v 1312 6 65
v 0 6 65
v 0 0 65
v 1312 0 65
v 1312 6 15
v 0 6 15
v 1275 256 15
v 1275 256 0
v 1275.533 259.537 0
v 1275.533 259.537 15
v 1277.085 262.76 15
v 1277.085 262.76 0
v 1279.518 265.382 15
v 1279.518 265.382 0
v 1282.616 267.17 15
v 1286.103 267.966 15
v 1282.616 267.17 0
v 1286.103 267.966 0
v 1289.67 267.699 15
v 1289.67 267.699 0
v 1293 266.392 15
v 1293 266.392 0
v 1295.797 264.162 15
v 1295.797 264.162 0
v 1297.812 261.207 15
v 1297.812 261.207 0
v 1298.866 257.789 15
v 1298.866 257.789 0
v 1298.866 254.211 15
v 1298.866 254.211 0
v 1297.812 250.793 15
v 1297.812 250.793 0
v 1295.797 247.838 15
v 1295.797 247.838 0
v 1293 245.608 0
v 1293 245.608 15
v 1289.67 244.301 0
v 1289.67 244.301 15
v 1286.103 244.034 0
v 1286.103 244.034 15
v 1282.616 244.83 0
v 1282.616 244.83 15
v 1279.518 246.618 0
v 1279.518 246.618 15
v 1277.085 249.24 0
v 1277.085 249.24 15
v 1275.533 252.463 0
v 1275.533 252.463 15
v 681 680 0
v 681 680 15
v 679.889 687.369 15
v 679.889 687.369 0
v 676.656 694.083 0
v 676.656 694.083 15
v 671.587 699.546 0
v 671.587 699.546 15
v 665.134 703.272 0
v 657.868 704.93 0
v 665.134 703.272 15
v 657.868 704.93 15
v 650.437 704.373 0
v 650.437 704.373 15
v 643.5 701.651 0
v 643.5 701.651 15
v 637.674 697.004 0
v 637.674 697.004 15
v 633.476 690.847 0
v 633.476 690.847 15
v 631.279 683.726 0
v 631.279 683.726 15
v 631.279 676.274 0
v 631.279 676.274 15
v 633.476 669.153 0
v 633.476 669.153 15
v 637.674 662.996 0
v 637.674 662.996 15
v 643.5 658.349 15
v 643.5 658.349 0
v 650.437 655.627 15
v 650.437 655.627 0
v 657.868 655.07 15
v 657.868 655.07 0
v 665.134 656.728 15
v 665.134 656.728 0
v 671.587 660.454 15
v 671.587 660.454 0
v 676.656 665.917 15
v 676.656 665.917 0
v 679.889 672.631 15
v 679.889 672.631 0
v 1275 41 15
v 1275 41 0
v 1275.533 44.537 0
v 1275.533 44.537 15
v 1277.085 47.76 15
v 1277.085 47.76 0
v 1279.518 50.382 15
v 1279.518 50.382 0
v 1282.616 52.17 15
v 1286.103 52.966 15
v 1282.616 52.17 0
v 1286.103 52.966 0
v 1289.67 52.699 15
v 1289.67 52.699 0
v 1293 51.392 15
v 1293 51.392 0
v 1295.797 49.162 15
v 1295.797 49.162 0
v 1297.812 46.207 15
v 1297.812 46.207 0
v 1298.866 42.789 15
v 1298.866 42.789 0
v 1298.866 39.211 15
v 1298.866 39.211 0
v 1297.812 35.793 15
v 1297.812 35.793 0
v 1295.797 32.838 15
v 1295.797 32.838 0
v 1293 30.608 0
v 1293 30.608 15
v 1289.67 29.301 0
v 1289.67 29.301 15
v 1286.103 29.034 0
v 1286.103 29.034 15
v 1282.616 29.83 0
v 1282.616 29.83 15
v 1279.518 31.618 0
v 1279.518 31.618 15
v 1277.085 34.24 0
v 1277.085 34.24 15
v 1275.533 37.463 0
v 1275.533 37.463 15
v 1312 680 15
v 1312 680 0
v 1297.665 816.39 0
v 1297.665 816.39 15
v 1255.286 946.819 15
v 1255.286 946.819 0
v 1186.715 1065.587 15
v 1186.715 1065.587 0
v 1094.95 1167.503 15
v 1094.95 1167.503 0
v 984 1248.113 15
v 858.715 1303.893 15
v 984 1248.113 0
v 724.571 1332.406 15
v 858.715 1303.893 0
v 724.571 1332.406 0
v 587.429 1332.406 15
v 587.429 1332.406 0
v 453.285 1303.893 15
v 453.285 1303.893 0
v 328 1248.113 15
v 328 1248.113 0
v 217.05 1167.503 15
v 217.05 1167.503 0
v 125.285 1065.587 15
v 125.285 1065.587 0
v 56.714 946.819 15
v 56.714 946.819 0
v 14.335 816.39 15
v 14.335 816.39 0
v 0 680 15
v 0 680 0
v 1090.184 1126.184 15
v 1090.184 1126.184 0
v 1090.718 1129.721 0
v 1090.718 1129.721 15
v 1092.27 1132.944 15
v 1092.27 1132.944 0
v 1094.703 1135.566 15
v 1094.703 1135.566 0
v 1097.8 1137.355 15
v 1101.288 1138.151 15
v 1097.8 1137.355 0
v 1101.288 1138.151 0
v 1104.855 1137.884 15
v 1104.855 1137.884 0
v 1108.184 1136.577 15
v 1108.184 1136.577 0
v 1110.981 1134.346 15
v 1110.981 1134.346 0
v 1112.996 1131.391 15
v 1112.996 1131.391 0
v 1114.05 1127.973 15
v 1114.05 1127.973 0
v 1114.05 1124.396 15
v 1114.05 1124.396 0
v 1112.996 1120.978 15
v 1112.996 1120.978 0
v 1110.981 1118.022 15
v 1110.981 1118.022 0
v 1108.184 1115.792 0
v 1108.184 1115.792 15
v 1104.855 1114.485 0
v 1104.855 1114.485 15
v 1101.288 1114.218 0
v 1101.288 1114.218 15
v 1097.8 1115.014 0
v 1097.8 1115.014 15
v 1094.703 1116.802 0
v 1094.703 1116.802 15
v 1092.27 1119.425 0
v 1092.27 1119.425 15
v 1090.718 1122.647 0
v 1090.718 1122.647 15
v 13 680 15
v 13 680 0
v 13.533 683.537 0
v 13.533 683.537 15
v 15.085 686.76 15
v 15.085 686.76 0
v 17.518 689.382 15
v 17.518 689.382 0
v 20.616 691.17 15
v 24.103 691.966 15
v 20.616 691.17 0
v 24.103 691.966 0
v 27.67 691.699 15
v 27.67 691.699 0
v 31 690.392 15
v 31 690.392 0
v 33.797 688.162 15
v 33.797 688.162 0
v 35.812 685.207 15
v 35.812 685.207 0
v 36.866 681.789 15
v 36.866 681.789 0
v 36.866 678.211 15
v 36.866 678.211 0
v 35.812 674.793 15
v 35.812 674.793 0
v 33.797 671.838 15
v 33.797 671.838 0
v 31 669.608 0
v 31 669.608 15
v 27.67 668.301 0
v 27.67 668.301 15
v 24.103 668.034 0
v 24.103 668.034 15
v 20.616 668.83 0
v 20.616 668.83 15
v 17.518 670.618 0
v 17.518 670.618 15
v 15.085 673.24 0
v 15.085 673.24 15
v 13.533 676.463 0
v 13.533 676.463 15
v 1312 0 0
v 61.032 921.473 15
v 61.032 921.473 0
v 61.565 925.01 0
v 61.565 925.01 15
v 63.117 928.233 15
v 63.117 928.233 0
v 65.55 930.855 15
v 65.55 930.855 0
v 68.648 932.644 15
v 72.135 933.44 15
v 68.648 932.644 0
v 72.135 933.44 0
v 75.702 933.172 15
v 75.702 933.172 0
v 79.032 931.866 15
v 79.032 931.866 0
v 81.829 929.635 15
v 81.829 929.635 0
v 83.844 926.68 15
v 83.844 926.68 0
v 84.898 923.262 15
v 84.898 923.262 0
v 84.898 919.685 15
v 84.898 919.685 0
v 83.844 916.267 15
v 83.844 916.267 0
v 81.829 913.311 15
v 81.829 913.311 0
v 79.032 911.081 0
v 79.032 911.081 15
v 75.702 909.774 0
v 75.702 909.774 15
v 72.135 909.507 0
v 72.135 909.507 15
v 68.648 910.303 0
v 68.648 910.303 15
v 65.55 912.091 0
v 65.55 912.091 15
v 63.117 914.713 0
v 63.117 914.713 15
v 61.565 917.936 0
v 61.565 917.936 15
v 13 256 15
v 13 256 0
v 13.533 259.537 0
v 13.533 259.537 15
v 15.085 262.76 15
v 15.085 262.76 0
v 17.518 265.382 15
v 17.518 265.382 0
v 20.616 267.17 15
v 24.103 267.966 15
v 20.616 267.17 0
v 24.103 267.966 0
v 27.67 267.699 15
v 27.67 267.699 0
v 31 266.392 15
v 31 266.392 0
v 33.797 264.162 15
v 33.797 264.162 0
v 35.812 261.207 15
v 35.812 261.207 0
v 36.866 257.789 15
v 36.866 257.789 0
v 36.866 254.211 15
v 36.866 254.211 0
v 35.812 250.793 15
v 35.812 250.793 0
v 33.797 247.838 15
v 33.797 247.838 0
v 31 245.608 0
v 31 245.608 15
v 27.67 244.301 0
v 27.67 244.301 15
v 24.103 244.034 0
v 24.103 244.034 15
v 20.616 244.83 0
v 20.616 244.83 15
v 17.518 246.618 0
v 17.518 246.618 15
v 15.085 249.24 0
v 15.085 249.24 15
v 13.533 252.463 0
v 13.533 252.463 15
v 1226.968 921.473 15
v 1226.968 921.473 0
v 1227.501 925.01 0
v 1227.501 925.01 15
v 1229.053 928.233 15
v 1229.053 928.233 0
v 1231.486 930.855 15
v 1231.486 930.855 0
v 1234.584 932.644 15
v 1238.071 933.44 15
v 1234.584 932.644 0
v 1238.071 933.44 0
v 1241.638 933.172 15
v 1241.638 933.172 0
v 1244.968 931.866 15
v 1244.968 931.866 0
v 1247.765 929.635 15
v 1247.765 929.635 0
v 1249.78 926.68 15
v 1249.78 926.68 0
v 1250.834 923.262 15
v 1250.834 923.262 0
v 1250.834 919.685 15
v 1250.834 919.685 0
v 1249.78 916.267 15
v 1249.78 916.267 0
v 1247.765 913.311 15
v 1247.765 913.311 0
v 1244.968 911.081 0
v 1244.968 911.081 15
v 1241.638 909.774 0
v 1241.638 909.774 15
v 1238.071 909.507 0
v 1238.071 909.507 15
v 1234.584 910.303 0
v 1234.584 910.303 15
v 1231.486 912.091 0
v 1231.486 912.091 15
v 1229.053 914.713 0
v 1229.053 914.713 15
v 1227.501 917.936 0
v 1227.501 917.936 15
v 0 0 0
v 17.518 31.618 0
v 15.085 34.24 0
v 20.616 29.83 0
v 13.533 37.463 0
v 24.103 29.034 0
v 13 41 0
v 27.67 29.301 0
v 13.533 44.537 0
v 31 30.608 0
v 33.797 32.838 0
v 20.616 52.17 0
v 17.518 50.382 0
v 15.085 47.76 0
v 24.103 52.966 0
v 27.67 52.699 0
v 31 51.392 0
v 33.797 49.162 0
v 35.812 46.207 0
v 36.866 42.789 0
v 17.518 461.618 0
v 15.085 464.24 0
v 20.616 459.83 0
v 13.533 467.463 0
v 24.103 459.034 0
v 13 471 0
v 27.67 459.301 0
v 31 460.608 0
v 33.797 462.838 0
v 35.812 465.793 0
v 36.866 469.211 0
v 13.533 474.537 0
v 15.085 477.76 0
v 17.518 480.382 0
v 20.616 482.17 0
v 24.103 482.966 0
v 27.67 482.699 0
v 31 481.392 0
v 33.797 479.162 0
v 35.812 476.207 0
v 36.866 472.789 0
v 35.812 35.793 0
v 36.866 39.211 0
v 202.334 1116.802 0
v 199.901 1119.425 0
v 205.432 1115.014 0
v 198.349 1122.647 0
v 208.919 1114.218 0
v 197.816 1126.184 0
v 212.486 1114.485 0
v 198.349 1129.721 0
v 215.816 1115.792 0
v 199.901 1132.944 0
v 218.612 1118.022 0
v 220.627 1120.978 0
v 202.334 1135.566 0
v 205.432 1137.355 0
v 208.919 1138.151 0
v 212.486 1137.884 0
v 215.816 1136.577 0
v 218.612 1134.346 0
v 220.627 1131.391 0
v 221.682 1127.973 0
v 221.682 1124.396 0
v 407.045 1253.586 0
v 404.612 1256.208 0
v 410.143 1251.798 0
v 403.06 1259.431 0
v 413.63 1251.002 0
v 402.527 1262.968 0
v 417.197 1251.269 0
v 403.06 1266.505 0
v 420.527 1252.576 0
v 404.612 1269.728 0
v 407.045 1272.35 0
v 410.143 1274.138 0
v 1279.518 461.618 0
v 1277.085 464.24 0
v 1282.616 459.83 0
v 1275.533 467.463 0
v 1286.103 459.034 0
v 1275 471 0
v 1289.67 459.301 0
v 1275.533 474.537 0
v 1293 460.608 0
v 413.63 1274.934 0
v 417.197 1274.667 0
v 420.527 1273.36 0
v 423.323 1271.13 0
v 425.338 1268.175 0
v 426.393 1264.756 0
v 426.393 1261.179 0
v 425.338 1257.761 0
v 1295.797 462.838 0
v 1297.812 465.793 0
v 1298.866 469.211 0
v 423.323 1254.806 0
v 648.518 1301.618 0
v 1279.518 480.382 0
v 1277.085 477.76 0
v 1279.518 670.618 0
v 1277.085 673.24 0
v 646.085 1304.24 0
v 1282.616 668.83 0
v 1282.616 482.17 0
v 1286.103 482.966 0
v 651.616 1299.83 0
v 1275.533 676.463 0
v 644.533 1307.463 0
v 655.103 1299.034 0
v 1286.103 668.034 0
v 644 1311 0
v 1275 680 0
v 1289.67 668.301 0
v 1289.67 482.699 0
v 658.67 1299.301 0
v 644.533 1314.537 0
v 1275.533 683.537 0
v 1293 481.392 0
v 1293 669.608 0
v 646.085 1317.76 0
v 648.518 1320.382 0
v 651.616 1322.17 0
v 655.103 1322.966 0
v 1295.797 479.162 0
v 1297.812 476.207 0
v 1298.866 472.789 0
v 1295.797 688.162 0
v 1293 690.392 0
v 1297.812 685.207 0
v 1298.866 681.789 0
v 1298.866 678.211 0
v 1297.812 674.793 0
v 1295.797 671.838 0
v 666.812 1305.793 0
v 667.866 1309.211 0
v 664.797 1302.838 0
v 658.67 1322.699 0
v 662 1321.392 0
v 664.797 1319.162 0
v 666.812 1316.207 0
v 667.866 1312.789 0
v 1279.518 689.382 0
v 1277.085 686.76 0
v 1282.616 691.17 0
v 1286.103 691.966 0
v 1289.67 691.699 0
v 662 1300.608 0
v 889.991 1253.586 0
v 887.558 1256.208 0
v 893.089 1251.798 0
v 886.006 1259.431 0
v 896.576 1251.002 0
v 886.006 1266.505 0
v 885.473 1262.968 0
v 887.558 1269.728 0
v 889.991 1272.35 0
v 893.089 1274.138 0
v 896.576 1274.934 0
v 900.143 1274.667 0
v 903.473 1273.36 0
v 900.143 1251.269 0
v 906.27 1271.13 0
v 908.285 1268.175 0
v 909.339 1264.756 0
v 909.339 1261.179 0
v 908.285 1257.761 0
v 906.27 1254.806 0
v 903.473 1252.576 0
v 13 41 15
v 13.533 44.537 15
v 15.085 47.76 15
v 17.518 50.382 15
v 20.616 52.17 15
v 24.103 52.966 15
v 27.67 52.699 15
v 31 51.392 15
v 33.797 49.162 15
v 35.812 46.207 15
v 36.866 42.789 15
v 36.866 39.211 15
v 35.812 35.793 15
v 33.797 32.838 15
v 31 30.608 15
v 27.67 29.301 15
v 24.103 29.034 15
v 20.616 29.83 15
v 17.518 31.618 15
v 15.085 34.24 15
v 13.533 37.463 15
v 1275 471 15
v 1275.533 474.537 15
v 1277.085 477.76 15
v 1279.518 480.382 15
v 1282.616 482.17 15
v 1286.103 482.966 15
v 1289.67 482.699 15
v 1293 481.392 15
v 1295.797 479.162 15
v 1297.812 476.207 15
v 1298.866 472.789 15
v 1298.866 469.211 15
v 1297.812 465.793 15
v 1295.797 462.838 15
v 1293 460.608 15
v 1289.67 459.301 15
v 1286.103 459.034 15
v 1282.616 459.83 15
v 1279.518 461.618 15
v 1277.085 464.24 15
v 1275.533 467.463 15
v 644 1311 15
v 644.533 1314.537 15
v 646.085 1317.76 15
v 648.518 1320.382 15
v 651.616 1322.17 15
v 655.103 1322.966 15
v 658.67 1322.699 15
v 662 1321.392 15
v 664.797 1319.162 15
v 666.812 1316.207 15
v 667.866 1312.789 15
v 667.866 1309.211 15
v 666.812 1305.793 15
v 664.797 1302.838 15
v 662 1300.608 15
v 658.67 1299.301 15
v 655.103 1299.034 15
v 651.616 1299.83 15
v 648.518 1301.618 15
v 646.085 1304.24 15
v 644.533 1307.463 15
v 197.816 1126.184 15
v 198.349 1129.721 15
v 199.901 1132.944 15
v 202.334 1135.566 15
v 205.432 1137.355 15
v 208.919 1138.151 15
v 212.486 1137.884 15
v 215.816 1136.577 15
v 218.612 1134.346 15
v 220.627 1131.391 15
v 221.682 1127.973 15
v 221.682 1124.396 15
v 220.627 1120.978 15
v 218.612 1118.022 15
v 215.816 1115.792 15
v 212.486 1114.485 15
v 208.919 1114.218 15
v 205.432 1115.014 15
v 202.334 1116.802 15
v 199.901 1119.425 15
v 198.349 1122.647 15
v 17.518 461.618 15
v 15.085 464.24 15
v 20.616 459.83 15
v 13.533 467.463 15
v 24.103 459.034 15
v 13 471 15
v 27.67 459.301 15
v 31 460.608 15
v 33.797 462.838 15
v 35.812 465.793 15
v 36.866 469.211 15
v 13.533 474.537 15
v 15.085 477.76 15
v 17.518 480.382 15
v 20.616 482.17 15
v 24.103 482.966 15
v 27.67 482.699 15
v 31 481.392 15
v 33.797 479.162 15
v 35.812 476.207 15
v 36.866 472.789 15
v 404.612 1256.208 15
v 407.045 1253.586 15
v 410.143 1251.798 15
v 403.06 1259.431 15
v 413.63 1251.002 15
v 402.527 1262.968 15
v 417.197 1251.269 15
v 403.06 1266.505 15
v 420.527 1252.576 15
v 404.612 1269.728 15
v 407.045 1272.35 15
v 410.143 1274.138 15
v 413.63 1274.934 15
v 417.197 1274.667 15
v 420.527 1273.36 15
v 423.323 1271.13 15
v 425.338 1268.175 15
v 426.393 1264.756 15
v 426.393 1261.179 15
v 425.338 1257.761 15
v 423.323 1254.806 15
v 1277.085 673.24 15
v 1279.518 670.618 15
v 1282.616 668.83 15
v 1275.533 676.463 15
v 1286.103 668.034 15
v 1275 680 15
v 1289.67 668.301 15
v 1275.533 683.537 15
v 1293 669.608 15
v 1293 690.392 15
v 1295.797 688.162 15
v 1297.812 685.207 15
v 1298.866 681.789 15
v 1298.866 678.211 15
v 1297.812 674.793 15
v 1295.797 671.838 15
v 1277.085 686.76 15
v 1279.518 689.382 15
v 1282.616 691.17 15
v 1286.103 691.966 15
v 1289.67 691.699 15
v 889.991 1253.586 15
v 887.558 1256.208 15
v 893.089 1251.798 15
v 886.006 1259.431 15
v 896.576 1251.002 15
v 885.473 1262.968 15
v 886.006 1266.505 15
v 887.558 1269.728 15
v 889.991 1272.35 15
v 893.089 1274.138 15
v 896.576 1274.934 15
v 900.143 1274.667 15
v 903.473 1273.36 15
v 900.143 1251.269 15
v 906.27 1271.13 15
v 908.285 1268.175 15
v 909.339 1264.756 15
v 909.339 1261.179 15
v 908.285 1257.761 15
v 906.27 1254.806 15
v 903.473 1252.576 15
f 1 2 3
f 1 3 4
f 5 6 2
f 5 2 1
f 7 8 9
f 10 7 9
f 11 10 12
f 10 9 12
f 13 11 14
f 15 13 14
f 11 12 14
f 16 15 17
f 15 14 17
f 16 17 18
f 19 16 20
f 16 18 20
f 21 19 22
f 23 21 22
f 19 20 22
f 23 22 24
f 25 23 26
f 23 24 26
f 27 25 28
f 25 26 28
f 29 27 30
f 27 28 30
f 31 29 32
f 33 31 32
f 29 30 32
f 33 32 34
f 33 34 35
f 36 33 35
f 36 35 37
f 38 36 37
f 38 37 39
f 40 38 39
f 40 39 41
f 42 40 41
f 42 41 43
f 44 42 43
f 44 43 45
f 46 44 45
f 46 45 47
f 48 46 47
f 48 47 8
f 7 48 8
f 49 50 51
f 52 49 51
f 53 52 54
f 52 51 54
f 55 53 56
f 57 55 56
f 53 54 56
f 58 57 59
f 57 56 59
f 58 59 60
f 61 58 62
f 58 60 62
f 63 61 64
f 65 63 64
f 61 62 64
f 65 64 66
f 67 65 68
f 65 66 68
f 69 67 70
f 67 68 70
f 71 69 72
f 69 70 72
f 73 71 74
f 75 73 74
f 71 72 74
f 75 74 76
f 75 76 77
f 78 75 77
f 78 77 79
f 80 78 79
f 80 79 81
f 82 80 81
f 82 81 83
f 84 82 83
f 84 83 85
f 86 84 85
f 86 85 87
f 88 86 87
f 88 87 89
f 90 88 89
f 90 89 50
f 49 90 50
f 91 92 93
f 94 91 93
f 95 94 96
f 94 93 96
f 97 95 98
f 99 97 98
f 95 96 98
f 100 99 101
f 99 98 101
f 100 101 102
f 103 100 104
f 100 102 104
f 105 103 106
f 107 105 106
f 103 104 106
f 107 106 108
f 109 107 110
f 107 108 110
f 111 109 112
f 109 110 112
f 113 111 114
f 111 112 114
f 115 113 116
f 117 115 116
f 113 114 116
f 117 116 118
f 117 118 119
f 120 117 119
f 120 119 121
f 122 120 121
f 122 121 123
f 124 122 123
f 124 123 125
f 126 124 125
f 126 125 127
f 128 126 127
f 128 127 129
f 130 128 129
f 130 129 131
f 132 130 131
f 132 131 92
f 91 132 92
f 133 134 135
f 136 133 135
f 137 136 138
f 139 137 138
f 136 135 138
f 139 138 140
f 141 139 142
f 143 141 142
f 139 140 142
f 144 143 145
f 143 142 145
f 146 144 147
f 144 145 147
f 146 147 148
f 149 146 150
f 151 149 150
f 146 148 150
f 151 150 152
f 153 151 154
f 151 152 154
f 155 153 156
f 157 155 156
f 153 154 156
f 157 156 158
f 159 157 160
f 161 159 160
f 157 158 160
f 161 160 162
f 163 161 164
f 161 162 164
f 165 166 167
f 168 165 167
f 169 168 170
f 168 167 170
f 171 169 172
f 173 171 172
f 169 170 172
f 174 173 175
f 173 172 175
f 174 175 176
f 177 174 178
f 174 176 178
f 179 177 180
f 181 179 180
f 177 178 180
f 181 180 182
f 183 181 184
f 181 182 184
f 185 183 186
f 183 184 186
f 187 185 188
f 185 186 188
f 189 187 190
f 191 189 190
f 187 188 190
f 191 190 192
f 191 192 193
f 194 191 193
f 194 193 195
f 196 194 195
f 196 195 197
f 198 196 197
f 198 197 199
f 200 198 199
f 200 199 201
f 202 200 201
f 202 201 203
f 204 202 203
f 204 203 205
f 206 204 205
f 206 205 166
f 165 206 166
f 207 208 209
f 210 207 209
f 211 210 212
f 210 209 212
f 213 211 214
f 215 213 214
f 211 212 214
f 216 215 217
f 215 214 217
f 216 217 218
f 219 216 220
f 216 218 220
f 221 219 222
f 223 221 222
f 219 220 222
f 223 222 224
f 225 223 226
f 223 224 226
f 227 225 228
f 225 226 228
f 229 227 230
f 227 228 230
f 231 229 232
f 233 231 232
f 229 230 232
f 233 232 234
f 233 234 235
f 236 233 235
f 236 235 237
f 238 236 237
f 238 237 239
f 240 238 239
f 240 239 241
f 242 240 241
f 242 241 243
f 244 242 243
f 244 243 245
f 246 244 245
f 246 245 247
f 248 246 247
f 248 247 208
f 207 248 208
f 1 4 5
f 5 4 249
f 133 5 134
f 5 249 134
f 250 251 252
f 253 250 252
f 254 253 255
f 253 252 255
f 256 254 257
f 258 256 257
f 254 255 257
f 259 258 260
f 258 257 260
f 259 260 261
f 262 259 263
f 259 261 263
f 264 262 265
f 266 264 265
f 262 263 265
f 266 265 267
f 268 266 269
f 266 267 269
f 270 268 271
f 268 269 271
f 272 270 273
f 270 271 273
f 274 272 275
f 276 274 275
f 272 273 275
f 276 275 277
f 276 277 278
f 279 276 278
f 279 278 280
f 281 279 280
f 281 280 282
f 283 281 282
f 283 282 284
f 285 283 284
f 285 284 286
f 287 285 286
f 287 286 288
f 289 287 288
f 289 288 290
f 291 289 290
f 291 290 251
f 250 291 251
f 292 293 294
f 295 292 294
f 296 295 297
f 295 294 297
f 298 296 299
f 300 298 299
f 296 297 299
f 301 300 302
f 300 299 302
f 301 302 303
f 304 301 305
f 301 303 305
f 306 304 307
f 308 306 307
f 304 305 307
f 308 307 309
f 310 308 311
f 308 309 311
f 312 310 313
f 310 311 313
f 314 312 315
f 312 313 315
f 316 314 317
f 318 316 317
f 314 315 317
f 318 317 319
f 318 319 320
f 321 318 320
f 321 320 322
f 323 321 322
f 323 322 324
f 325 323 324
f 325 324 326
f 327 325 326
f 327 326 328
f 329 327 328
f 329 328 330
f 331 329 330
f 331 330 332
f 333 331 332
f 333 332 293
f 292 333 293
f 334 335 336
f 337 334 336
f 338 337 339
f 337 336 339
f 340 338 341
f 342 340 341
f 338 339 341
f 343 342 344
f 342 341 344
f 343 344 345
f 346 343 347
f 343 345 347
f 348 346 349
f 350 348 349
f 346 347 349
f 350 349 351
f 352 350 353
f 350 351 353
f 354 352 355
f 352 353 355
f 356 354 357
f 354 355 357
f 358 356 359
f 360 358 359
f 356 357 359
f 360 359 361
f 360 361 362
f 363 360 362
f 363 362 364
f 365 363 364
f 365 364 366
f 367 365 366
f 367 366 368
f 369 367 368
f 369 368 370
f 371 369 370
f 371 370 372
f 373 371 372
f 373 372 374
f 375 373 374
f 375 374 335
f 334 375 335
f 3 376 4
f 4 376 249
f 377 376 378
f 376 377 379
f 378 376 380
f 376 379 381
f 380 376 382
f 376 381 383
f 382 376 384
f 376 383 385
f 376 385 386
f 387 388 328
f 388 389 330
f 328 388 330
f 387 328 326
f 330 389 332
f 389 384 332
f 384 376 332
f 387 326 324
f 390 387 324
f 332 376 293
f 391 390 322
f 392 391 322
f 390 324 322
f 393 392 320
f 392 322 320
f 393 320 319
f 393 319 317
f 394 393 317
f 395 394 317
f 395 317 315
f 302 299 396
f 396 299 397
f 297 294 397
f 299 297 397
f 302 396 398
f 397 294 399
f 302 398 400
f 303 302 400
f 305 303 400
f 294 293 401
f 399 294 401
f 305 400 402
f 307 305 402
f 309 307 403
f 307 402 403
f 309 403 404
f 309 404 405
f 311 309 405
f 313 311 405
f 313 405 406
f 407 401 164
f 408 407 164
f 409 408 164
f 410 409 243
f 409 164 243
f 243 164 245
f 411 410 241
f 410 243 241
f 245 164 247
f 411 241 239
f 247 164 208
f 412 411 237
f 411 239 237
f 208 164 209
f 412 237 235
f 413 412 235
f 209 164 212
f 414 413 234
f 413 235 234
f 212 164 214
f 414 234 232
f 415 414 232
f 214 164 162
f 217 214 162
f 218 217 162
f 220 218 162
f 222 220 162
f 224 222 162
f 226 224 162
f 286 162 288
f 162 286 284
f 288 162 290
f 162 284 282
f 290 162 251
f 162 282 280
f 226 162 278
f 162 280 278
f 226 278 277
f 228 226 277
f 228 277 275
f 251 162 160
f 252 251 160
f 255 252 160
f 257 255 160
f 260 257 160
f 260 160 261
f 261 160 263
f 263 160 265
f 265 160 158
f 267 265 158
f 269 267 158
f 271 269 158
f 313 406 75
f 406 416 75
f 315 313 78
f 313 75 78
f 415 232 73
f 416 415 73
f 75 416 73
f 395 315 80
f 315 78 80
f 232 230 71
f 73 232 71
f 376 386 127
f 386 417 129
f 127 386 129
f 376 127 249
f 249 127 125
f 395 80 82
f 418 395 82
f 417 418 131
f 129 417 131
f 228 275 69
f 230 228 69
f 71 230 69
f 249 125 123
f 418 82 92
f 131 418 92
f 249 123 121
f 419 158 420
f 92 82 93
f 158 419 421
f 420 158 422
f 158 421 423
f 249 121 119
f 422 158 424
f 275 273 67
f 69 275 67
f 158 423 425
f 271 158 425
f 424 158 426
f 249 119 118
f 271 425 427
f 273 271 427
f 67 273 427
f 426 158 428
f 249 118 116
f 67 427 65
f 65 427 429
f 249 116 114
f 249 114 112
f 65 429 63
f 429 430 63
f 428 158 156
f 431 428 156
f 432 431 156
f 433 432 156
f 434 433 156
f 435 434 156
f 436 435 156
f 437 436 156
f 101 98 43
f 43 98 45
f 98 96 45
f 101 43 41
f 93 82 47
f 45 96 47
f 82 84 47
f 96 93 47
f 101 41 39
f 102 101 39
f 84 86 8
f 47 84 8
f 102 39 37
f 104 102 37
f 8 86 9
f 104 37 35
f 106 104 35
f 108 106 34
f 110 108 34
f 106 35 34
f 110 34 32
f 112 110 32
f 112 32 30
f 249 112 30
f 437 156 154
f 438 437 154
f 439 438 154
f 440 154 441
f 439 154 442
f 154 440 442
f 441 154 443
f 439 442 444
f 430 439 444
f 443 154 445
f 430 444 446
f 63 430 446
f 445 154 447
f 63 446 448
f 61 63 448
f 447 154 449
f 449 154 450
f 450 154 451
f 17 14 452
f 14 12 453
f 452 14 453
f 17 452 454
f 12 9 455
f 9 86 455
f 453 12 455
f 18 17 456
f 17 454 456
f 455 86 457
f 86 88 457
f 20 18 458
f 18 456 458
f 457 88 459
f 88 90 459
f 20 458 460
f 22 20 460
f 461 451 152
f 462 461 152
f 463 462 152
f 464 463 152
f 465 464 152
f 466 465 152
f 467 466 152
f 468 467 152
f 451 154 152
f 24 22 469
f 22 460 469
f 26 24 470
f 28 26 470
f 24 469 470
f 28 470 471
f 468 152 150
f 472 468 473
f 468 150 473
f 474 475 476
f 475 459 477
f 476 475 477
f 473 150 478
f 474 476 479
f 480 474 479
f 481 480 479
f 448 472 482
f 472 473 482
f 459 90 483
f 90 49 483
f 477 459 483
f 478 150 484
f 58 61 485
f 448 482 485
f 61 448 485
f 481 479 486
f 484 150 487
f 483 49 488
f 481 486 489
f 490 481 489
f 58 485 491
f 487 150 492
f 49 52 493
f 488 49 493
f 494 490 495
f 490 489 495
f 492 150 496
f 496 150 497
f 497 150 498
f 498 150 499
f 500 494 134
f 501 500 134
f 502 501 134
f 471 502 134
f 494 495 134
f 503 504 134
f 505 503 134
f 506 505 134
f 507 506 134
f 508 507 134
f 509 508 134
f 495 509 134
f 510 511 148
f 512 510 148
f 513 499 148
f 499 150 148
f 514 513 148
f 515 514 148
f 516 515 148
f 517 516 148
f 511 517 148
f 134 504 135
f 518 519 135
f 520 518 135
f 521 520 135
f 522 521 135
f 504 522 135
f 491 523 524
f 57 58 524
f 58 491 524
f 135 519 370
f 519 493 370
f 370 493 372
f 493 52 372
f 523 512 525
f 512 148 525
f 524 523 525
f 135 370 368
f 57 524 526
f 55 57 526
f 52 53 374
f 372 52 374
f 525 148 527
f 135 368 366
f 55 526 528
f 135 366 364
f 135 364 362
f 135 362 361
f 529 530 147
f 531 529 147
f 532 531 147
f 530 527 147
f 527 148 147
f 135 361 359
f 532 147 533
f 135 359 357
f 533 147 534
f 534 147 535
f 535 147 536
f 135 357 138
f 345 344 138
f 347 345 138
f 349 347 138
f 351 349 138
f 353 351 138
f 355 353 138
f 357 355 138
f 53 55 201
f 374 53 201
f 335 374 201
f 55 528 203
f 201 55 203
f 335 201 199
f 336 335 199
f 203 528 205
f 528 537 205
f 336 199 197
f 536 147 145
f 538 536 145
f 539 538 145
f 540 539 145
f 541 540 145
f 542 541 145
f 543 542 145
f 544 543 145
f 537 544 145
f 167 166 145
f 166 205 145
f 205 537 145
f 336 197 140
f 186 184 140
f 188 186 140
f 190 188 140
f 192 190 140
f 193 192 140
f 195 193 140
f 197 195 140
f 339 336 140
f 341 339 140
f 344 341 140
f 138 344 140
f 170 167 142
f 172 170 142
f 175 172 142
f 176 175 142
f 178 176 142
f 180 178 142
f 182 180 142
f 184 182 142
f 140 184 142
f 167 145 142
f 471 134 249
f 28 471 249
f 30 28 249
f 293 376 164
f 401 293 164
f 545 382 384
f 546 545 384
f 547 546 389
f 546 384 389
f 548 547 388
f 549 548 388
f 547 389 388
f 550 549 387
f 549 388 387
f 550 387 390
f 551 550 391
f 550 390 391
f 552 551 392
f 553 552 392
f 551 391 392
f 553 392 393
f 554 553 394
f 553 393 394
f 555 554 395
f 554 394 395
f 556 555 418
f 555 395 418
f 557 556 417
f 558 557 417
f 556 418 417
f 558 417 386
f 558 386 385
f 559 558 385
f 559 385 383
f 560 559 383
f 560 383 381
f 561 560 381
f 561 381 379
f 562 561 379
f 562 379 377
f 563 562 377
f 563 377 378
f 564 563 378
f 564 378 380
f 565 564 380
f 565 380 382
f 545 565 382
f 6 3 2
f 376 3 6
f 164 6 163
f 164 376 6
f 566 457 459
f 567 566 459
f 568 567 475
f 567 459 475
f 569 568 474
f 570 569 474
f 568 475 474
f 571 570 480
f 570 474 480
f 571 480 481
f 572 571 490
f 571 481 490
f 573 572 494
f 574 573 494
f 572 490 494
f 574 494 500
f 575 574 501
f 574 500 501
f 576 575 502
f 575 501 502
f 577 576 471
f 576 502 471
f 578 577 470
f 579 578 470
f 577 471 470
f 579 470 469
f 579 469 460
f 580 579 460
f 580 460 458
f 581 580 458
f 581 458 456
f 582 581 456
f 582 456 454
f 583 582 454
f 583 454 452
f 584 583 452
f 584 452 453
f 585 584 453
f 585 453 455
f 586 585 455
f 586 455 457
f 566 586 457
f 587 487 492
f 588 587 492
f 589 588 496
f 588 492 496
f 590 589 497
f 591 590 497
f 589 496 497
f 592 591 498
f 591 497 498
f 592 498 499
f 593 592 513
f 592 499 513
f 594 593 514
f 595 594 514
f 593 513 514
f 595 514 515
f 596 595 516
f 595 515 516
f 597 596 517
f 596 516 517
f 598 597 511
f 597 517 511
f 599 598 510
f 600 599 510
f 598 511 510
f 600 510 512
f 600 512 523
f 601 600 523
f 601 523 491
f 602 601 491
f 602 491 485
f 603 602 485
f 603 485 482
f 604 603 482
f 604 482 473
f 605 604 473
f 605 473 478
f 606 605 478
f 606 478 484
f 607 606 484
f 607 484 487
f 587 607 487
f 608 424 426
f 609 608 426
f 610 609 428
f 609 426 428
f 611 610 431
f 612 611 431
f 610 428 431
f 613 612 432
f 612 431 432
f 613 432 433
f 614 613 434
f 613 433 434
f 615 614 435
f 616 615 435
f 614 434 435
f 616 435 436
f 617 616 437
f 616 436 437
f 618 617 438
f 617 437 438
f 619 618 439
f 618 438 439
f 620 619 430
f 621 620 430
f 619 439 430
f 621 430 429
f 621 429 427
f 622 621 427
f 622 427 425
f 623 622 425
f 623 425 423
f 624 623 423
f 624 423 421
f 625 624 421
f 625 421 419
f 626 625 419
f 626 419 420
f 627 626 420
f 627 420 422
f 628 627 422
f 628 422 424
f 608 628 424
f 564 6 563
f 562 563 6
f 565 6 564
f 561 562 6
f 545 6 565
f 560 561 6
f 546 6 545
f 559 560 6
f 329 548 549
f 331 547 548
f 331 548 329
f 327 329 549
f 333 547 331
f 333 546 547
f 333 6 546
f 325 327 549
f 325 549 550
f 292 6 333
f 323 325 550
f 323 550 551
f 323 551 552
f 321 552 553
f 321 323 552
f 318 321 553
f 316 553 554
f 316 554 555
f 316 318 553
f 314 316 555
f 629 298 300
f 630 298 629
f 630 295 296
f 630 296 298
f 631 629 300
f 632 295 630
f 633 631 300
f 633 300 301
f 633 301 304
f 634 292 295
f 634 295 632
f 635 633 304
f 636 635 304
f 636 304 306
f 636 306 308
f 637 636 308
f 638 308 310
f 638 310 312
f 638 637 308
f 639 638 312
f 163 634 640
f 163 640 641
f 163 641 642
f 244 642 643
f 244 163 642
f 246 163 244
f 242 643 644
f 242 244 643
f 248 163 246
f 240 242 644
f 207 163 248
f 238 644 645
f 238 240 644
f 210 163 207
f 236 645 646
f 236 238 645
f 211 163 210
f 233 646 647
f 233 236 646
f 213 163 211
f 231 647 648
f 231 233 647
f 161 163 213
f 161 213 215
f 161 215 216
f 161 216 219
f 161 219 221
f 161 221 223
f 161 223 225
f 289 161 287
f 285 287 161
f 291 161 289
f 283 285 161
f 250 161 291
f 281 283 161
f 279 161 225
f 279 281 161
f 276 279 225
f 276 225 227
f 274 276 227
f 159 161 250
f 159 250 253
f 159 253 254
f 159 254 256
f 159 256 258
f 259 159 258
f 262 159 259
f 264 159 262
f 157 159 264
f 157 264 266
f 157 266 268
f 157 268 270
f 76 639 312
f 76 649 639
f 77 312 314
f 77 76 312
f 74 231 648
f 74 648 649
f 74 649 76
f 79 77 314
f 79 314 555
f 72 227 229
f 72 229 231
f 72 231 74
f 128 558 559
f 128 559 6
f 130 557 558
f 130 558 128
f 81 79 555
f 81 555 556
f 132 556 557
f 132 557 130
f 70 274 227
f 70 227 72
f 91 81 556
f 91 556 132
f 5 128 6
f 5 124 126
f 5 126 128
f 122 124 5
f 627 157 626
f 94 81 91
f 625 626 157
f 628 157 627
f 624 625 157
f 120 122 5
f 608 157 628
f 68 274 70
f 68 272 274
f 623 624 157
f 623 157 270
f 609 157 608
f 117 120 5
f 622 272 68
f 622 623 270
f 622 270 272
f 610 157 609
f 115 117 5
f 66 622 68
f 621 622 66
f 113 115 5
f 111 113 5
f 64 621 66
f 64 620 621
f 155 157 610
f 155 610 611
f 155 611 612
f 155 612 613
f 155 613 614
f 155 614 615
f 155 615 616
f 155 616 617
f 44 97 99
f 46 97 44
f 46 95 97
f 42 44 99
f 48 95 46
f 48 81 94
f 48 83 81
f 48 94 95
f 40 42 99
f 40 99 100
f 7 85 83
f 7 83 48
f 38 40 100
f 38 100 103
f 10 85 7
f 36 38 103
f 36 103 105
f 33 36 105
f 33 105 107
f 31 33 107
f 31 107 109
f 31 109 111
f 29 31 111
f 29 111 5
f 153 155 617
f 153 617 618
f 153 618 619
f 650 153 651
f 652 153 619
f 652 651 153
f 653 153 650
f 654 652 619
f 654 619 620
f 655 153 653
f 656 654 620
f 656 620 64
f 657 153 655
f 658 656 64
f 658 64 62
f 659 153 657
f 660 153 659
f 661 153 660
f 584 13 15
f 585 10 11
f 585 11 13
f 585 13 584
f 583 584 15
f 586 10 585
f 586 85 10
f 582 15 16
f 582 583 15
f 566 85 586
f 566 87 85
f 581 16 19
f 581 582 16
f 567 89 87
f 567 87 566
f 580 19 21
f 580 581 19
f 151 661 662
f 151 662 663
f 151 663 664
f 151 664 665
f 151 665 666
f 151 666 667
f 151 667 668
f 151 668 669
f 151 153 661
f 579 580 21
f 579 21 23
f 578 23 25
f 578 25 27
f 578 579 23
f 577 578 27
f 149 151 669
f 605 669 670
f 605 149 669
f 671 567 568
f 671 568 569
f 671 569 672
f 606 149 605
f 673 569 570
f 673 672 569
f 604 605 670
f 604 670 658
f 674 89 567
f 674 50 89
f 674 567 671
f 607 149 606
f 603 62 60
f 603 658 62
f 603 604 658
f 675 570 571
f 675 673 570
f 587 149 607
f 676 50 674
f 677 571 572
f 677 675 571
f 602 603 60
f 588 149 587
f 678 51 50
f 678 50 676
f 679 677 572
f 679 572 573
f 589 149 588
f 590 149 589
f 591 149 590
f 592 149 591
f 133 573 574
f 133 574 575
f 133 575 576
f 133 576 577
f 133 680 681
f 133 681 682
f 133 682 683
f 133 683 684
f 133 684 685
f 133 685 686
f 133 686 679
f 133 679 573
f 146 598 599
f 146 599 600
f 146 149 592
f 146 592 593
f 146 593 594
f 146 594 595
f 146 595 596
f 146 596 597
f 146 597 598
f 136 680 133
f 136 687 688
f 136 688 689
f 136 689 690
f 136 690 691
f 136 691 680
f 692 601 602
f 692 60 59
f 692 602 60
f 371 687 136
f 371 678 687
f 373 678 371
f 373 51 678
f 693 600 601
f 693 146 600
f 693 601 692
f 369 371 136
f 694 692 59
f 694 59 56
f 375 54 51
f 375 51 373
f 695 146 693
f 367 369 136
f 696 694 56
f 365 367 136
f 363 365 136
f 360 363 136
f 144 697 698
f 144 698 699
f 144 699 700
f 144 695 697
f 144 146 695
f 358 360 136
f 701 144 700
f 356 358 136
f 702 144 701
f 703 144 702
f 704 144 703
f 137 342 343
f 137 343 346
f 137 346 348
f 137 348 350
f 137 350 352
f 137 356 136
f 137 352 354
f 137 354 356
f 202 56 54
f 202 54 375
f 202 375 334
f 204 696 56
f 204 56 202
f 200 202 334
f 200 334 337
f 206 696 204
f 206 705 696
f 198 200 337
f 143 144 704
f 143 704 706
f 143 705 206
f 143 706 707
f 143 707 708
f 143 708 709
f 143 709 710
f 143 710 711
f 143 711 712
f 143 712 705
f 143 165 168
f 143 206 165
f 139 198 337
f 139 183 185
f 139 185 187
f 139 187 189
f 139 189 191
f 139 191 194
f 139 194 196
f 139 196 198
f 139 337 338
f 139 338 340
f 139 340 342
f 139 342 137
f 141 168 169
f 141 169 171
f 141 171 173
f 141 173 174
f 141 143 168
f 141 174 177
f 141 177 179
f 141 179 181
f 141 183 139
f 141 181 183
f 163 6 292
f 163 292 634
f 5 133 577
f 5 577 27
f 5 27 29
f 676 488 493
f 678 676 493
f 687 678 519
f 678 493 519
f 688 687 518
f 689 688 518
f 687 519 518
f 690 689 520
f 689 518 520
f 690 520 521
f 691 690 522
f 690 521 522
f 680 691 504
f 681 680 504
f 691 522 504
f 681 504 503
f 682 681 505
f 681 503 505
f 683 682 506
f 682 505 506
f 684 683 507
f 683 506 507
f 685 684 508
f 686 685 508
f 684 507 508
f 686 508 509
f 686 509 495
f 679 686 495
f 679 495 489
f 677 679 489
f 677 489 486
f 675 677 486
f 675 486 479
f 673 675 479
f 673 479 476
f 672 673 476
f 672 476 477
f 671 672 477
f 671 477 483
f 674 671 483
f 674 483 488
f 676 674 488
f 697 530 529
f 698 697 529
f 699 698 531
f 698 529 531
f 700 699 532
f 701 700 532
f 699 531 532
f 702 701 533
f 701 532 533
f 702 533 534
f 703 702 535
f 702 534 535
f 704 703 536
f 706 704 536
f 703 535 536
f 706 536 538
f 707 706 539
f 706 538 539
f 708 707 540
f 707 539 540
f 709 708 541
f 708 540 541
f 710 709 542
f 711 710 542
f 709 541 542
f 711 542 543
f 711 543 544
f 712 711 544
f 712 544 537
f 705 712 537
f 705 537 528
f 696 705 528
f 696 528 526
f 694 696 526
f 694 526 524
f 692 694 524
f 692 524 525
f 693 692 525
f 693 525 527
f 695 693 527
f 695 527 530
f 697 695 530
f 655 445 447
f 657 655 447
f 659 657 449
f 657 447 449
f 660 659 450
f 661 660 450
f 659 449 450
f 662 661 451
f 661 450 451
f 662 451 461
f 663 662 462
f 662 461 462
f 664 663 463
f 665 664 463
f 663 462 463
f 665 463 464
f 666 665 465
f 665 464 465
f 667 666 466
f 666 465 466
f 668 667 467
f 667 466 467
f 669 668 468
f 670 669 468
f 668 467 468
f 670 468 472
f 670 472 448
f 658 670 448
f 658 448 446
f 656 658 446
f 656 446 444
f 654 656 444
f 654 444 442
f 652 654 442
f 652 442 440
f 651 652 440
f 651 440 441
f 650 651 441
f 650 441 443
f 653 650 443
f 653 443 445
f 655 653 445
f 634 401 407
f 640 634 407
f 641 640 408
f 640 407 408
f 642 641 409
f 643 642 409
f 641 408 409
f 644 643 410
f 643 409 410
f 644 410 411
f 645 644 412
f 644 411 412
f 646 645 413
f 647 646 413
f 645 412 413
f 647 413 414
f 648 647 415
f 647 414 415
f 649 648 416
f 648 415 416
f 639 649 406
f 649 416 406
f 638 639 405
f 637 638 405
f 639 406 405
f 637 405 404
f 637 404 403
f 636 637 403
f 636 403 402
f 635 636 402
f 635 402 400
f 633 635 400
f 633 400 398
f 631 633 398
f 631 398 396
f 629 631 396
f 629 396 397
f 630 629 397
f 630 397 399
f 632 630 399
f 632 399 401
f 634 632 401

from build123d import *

# Parameters (mm, degrees)
BOSS_EXTRUDE1_DEPTH    = 15
BOTTOM_FLANGE_W        = 1312
BOTTOM_FLANGE_H        = 6
BOSS_EXTRUDE2_DEPTH    = 50
F_24_0MM_DOWEL_HOLE1_D = 24
CENTER_HOLE_R          = 25
CUT_EXTRUDE1_DEPTH     = 16


with BuildPart() as part:
    # base plate → Boss-Extrude1 (new body)
    with BuildSketch(Plane.XY):
        with BuildLine():
            Line((0, 0), (1312, 0))
            Line((1312, 0), (1312, 680))
            ThreePointArc((1312, 680), (656, 1336), (0, 680))
            Line((0, 680), (0, 0))
        make_face()
    extrude(amount=BOSS_EXTRUDE1_DEPTH)

    # bottom flange → Boss-Extrude2 (add)
    with BuildSketch(Plane.XY.offset(15)):
        with Locations((656, 3)):
            Rectangle(BOTTOM_FLANGE_W, BOTTOM_FLANGE_H)
    extrude(amount=BOSS_EXTRUDE2_DEPTH)

    # Ø24.0mm Dowel Hole1 (through all)
    with Locations(Plane.XY.offset(15)):
        with Locations((25, 680), (1287, 680), (25, 41), (25, 256), (25, 471), (1287, 41), (1287, 256), (1287, 471), (1238.967985015, 921.473245822), (1102.184378929, 1126.184378929), (897.473245822, 1262.967985015), (656, 1311), (414.526754178, 1262.967985015), (209.815621071, 1126.184378929), (73.032014985, 921.473245822)):
            Hole(F_24_0MM_DOWEL_HOLE1_D / 2)

    # center hole → Cut-Extrude1 (cut, through all)
    with BuildSketch(Plane.XY.offset(15)):
        with Locations((656, 680)):
            Circle(CENTER_HOLE_R)
    extrude(amount=-CUT_EXTRUDE1_DEPTH, mode=Mode.SUBTRACT)


solid = part.part
